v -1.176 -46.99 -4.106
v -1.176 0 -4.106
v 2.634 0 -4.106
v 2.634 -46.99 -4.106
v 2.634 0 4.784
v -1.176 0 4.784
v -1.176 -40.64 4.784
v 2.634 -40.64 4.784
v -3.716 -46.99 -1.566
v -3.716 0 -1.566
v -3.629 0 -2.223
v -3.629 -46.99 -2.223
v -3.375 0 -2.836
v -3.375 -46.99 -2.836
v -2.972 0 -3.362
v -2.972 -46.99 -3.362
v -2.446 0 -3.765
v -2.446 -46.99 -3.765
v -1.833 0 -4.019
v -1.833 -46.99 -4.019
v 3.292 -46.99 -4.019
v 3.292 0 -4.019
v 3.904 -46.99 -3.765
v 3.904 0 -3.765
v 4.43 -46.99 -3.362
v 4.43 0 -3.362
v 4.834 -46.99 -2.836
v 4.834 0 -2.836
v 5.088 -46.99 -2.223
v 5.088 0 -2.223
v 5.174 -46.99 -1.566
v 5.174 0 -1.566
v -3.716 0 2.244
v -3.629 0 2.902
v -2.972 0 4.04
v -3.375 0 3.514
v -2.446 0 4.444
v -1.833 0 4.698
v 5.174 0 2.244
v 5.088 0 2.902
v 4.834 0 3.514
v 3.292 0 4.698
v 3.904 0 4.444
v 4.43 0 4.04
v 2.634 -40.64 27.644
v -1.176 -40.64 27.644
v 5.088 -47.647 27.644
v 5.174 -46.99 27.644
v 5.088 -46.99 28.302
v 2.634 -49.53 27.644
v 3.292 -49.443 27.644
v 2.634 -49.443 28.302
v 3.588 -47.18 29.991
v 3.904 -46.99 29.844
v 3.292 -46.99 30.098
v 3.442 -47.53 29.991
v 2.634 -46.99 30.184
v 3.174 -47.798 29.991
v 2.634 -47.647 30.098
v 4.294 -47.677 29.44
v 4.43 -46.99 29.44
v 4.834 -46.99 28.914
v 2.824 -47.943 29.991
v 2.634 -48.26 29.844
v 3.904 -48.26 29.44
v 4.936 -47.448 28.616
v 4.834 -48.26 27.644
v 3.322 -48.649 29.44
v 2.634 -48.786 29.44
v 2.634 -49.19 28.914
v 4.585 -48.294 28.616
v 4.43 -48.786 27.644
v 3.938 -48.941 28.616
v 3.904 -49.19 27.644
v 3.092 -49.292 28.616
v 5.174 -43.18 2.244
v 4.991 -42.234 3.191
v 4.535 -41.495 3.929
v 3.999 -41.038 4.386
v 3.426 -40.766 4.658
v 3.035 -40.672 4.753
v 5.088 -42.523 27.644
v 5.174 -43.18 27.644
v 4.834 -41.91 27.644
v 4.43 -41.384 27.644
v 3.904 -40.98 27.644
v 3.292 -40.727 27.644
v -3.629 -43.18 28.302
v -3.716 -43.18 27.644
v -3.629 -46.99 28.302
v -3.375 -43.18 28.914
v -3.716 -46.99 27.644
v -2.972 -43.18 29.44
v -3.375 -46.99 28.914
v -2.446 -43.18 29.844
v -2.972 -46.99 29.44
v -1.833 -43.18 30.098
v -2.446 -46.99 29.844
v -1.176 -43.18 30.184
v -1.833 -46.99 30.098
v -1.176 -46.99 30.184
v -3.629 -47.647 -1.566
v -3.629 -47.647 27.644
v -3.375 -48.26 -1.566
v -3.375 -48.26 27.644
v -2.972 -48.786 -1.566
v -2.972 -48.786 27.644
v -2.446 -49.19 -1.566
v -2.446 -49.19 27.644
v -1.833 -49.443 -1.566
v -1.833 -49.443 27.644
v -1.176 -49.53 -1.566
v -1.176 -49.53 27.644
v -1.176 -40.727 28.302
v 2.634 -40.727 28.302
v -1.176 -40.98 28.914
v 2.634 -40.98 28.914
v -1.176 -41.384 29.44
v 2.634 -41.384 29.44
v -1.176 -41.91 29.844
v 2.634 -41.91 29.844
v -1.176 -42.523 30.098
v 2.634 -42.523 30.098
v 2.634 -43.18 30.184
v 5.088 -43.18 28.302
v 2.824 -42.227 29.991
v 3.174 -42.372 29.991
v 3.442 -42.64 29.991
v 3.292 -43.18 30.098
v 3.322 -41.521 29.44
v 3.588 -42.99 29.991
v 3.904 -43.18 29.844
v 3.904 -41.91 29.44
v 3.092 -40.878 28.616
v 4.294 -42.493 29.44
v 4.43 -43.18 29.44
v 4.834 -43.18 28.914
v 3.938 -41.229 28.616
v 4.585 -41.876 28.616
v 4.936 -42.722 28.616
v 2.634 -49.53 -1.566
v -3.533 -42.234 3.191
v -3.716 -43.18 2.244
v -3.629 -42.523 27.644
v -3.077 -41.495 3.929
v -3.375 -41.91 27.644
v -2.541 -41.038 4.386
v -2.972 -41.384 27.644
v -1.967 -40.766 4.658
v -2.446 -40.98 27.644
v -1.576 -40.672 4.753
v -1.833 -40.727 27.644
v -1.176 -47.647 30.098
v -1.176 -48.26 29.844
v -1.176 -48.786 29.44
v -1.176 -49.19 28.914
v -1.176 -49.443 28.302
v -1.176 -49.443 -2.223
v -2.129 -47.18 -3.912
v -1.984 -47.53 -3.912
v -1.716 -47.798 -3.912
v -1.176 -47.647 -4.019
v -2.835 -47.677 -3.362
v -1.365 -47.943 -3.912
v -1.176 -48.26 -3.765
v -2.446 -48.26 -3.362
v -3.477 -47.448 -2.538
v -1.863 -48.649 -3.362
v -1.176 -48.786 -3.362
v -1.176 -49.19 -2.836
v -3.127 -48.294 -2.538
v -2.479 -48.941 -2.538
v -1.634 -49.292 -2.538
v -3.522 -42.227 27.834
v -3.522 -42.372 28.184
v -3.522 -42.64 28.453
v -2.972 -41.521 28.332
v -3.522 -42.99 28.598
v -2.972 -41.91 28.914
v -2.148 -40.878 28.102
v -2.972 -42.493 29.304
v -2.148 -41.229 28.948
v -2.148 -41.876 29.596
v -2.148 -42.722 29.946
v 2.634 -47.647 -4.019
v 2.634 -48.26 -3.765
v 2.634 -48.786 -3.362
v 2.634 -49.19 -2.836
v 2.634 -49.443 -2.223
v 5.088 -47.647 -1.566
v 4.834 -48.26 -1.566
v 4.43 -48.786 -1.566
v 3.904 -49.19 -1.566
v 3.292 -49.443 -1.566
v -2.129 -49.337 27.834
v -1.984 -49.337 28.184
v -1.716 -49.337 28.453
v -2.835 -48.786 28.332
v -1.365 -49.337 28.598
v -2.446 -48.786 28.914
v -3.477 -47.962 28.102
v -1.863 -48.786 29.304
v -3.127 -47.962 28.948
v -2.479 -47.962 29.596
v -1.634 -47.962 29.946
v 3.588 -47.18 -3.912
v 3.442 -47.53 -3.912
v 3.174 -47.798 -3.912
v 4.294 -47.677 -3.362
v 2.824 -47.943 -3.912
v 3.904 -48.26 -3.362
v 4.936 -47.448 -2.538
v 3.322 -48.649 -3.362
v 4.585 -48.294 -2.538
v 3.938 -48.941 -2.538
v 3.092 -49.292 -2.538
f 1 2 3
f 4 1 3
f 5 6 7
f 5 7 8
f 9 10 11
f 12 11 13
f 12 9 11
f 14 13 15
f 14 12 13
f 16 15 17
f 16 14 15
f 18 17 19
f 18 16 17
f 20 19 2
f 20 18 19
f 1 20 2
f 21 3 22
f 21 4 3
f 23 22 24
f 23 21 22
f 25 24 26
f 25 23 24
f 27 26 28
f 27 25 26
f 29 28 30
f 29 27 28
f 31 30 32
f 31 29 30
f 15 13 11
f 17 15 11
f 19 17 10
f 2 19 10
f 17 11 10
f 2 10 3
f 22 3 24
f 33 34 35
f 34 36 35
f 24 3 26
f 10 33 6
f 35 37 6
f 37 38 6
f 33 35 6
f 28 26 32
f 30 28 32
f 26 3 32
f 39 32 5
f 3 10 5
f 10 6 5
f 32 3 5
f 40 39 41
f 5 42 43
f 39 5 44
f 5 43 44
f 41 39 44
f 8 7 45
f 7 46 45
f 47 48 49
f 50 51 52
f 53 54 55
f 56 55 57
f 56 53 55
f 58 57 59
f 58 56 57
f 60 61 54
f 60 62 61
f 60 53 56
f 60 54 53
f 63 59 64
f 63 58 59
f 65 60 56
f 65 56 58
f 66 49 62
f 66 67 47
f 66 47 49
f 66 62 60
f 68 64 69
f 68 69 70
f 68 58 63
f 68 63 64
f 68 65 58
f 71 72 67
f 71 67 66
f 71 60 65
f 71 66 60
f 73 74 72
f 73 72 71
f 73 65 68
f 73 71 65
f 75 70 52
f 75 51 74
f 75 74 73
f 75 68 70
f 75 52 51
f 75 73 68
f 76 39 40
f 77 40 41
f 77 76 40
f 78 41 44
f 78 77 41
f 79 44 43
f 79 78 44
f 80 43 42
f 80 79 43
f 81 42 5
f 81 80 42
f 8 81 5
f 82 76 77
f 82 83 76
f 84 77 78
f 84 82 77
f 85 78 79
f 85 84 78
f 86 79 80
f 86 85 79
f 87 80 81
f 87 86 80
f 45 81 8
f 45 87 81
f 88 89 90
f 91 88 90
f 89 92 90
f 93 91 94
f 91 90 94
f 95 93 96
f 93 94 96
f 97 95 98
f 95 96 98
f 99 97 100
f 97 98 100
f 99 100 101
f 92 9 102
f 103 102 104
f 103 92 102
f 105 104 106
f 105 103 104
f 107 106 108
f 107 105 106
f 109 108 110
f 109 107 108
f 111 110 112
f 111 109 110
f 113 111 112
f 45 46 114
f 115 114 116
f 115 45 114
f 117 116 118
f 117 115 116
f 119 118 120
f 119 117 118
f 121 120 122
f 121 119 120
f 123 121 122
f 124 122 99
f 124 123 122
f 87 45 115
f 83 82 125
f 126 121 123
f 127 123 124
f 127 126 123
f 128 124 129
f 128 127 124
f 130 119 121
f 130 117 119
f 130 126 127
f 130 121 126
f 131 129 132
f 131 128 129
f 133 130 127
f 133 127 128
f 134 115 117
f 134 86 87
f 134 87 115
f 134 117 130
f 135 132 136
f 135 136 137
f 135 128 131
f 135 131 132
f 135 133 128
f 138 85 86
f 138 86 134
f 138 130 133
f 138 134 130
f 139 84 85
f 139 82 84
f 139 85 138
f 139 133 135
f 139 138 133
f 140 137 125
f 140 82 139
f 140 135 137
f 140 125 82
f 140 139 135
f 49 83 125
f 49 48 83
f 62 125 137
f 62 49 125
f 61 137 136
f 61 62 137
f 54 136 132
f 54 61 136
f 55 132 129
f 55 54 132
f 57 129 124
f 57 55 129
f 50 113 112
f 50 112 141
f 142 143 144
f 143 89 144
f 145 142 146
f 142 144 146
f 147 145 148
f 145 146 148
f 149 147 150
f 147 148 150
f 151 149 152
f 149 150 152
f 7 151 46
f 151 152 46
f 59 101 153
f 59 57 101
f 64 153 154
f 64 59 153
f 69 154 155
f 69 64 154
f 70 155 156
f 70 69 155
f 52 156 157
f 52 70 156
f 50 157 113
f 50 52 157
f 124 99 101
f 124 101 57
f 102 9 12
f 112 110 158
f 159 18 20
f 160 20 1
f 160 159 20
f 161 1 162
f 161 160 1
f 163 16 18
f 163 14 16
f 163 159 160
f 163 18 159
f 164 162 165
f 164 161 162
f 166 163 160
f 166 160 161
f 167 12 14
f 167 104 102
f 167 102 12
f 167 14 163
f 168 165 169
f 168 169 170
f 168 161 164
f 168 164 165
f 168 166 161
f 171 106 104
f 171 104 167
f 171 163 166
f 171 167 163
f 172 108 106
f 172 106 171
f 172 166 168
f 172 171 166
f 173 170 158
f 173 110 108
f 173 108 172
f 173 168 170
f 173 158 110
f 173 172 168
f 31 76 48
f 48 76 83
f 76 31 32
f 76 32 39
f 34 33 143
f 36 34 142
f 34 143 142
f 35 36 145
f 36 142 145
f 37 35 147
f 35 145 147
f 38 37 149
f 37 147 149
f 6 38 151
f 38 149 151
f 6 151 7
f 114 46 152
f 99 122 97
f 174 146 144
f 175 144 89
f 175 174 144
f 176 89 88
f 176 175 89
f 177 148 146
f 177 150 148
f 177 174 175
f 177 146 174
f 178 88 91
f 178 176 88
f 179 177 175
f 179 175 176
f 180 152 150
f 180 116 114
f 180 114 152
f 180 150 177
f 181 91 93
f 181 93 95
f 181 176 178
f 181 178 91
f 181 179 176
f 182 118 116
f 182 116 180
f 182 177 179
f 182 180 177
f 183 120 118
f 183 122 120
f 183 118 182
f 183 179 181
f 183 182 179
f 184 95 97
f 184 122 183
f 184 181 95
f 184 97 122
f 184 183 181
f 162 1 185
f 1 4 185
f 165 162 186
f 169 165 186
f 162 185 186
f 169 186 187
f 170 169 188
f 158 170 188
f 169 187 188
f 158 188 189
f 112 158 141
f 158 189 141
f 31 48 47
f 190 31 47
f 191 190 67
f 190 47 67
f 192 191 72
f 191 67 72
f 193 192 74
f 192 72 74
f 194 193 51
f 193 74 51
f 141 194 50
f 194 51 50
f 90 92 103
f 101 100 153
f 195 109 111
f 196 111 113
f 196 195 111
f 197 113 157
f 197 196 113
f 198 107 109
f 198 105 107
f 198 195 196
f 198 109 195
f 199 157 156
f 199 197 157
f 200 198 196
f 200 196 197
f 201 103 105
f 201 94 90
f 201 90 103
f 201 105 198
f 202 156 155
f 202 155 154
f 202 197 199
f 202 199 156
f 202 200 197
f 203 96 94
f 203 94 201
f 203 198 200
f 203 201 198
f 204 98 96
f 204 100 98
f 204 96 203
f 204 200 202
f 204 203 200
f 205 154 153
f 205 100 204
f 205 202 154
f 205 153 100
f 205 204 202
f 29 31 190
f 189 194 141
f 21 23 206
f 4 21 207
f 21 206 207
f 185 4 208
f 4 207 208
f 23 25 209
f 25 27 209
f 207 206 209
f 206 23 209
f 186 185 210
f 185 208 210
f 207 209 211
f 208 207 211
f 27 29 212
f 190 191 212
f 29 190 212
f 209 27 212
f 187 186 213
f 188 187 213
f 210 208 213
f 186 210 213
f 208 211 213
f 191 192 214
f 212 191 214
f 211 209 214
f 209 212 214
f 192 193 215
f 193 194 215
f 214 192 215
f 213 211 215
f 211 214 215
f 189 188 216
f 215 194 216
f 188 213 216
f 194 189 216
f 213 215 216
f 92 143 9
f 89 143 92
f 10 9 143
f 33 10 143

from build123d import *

# Parameters (mm, degrees)
F0_W     = 8.89
F0_H     = 8.89
F1_DEPTH = 40.64
F2_W     = 8.89
F2_H     = 34.29
F3_DEPTH = 8.89
F4_R     = 2.54


with BuildPart() as f1:
    # F0 (on Front) → F1 (new body)
    with BuildSketch(Plane.XZ):
        with Locations((0.729244, 0.33937)):
            Rectangle(F0_W, F0_H)
    extrude(amount=F1_DEPTH)

    # F2 (on face) → F3 (join)
    with BuildSketch(Plane.XZ.offset(40.64)):
        with Locations((0.729244, 13.03937)):
            Rectangle(F2_W, F2_H)
    extrude(amount=F3_DEPTH)

    # F4
    f4_edges = [f1.edges().sort_by_distance(p)[0] for p in [
        (5.174244, -40.64, 17.48437),
        (0.729244, -40.64, 30.18437),
        (-3.715756, -40.64, 17.48437),
        (-3.715756, -45.085, 30.18437),
        (-3.715756, -49.53, 13.03937),
        (-3.715756, -20.32, 4.78437),
        (-3.715756, -24.765, -4.10563),
        (5.174244, -20.32, 4.78437),
        (5.174244, -49.53, 13.03937),
        (5.174244, -24.765, -4.10563),
        (0.729244, -49.53, -4.10563),
        (5.174244, -45.085, 30.18437),
        (0.729244, -49.53, 30.18437),
    ]]
    fillet(f4_edges, radius=F4_R)


solid = f1.part
